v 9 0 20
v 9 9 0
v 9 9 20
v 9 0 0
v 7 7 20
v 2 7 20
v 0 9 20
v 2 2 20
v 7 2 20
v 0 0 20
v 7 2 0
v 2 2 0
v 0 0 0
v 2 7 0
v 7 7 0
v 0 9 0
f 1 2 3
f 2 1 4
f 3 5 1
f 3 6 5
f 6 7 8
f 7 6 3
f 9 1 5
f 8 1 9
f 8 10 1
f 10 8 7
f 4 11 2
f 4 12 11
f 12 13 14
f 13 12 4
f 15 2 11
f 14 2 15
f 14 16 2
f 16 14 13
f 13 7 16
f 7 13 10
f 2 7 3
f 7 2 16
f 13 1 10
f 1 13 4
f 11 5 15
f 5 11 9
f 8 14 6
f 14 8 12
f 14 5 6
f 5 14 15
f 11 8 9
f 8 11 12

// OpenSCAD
difference()
{
  cube([9,9,20]);
  translate([2,2,-2]) cube([5,5,30]);
}
